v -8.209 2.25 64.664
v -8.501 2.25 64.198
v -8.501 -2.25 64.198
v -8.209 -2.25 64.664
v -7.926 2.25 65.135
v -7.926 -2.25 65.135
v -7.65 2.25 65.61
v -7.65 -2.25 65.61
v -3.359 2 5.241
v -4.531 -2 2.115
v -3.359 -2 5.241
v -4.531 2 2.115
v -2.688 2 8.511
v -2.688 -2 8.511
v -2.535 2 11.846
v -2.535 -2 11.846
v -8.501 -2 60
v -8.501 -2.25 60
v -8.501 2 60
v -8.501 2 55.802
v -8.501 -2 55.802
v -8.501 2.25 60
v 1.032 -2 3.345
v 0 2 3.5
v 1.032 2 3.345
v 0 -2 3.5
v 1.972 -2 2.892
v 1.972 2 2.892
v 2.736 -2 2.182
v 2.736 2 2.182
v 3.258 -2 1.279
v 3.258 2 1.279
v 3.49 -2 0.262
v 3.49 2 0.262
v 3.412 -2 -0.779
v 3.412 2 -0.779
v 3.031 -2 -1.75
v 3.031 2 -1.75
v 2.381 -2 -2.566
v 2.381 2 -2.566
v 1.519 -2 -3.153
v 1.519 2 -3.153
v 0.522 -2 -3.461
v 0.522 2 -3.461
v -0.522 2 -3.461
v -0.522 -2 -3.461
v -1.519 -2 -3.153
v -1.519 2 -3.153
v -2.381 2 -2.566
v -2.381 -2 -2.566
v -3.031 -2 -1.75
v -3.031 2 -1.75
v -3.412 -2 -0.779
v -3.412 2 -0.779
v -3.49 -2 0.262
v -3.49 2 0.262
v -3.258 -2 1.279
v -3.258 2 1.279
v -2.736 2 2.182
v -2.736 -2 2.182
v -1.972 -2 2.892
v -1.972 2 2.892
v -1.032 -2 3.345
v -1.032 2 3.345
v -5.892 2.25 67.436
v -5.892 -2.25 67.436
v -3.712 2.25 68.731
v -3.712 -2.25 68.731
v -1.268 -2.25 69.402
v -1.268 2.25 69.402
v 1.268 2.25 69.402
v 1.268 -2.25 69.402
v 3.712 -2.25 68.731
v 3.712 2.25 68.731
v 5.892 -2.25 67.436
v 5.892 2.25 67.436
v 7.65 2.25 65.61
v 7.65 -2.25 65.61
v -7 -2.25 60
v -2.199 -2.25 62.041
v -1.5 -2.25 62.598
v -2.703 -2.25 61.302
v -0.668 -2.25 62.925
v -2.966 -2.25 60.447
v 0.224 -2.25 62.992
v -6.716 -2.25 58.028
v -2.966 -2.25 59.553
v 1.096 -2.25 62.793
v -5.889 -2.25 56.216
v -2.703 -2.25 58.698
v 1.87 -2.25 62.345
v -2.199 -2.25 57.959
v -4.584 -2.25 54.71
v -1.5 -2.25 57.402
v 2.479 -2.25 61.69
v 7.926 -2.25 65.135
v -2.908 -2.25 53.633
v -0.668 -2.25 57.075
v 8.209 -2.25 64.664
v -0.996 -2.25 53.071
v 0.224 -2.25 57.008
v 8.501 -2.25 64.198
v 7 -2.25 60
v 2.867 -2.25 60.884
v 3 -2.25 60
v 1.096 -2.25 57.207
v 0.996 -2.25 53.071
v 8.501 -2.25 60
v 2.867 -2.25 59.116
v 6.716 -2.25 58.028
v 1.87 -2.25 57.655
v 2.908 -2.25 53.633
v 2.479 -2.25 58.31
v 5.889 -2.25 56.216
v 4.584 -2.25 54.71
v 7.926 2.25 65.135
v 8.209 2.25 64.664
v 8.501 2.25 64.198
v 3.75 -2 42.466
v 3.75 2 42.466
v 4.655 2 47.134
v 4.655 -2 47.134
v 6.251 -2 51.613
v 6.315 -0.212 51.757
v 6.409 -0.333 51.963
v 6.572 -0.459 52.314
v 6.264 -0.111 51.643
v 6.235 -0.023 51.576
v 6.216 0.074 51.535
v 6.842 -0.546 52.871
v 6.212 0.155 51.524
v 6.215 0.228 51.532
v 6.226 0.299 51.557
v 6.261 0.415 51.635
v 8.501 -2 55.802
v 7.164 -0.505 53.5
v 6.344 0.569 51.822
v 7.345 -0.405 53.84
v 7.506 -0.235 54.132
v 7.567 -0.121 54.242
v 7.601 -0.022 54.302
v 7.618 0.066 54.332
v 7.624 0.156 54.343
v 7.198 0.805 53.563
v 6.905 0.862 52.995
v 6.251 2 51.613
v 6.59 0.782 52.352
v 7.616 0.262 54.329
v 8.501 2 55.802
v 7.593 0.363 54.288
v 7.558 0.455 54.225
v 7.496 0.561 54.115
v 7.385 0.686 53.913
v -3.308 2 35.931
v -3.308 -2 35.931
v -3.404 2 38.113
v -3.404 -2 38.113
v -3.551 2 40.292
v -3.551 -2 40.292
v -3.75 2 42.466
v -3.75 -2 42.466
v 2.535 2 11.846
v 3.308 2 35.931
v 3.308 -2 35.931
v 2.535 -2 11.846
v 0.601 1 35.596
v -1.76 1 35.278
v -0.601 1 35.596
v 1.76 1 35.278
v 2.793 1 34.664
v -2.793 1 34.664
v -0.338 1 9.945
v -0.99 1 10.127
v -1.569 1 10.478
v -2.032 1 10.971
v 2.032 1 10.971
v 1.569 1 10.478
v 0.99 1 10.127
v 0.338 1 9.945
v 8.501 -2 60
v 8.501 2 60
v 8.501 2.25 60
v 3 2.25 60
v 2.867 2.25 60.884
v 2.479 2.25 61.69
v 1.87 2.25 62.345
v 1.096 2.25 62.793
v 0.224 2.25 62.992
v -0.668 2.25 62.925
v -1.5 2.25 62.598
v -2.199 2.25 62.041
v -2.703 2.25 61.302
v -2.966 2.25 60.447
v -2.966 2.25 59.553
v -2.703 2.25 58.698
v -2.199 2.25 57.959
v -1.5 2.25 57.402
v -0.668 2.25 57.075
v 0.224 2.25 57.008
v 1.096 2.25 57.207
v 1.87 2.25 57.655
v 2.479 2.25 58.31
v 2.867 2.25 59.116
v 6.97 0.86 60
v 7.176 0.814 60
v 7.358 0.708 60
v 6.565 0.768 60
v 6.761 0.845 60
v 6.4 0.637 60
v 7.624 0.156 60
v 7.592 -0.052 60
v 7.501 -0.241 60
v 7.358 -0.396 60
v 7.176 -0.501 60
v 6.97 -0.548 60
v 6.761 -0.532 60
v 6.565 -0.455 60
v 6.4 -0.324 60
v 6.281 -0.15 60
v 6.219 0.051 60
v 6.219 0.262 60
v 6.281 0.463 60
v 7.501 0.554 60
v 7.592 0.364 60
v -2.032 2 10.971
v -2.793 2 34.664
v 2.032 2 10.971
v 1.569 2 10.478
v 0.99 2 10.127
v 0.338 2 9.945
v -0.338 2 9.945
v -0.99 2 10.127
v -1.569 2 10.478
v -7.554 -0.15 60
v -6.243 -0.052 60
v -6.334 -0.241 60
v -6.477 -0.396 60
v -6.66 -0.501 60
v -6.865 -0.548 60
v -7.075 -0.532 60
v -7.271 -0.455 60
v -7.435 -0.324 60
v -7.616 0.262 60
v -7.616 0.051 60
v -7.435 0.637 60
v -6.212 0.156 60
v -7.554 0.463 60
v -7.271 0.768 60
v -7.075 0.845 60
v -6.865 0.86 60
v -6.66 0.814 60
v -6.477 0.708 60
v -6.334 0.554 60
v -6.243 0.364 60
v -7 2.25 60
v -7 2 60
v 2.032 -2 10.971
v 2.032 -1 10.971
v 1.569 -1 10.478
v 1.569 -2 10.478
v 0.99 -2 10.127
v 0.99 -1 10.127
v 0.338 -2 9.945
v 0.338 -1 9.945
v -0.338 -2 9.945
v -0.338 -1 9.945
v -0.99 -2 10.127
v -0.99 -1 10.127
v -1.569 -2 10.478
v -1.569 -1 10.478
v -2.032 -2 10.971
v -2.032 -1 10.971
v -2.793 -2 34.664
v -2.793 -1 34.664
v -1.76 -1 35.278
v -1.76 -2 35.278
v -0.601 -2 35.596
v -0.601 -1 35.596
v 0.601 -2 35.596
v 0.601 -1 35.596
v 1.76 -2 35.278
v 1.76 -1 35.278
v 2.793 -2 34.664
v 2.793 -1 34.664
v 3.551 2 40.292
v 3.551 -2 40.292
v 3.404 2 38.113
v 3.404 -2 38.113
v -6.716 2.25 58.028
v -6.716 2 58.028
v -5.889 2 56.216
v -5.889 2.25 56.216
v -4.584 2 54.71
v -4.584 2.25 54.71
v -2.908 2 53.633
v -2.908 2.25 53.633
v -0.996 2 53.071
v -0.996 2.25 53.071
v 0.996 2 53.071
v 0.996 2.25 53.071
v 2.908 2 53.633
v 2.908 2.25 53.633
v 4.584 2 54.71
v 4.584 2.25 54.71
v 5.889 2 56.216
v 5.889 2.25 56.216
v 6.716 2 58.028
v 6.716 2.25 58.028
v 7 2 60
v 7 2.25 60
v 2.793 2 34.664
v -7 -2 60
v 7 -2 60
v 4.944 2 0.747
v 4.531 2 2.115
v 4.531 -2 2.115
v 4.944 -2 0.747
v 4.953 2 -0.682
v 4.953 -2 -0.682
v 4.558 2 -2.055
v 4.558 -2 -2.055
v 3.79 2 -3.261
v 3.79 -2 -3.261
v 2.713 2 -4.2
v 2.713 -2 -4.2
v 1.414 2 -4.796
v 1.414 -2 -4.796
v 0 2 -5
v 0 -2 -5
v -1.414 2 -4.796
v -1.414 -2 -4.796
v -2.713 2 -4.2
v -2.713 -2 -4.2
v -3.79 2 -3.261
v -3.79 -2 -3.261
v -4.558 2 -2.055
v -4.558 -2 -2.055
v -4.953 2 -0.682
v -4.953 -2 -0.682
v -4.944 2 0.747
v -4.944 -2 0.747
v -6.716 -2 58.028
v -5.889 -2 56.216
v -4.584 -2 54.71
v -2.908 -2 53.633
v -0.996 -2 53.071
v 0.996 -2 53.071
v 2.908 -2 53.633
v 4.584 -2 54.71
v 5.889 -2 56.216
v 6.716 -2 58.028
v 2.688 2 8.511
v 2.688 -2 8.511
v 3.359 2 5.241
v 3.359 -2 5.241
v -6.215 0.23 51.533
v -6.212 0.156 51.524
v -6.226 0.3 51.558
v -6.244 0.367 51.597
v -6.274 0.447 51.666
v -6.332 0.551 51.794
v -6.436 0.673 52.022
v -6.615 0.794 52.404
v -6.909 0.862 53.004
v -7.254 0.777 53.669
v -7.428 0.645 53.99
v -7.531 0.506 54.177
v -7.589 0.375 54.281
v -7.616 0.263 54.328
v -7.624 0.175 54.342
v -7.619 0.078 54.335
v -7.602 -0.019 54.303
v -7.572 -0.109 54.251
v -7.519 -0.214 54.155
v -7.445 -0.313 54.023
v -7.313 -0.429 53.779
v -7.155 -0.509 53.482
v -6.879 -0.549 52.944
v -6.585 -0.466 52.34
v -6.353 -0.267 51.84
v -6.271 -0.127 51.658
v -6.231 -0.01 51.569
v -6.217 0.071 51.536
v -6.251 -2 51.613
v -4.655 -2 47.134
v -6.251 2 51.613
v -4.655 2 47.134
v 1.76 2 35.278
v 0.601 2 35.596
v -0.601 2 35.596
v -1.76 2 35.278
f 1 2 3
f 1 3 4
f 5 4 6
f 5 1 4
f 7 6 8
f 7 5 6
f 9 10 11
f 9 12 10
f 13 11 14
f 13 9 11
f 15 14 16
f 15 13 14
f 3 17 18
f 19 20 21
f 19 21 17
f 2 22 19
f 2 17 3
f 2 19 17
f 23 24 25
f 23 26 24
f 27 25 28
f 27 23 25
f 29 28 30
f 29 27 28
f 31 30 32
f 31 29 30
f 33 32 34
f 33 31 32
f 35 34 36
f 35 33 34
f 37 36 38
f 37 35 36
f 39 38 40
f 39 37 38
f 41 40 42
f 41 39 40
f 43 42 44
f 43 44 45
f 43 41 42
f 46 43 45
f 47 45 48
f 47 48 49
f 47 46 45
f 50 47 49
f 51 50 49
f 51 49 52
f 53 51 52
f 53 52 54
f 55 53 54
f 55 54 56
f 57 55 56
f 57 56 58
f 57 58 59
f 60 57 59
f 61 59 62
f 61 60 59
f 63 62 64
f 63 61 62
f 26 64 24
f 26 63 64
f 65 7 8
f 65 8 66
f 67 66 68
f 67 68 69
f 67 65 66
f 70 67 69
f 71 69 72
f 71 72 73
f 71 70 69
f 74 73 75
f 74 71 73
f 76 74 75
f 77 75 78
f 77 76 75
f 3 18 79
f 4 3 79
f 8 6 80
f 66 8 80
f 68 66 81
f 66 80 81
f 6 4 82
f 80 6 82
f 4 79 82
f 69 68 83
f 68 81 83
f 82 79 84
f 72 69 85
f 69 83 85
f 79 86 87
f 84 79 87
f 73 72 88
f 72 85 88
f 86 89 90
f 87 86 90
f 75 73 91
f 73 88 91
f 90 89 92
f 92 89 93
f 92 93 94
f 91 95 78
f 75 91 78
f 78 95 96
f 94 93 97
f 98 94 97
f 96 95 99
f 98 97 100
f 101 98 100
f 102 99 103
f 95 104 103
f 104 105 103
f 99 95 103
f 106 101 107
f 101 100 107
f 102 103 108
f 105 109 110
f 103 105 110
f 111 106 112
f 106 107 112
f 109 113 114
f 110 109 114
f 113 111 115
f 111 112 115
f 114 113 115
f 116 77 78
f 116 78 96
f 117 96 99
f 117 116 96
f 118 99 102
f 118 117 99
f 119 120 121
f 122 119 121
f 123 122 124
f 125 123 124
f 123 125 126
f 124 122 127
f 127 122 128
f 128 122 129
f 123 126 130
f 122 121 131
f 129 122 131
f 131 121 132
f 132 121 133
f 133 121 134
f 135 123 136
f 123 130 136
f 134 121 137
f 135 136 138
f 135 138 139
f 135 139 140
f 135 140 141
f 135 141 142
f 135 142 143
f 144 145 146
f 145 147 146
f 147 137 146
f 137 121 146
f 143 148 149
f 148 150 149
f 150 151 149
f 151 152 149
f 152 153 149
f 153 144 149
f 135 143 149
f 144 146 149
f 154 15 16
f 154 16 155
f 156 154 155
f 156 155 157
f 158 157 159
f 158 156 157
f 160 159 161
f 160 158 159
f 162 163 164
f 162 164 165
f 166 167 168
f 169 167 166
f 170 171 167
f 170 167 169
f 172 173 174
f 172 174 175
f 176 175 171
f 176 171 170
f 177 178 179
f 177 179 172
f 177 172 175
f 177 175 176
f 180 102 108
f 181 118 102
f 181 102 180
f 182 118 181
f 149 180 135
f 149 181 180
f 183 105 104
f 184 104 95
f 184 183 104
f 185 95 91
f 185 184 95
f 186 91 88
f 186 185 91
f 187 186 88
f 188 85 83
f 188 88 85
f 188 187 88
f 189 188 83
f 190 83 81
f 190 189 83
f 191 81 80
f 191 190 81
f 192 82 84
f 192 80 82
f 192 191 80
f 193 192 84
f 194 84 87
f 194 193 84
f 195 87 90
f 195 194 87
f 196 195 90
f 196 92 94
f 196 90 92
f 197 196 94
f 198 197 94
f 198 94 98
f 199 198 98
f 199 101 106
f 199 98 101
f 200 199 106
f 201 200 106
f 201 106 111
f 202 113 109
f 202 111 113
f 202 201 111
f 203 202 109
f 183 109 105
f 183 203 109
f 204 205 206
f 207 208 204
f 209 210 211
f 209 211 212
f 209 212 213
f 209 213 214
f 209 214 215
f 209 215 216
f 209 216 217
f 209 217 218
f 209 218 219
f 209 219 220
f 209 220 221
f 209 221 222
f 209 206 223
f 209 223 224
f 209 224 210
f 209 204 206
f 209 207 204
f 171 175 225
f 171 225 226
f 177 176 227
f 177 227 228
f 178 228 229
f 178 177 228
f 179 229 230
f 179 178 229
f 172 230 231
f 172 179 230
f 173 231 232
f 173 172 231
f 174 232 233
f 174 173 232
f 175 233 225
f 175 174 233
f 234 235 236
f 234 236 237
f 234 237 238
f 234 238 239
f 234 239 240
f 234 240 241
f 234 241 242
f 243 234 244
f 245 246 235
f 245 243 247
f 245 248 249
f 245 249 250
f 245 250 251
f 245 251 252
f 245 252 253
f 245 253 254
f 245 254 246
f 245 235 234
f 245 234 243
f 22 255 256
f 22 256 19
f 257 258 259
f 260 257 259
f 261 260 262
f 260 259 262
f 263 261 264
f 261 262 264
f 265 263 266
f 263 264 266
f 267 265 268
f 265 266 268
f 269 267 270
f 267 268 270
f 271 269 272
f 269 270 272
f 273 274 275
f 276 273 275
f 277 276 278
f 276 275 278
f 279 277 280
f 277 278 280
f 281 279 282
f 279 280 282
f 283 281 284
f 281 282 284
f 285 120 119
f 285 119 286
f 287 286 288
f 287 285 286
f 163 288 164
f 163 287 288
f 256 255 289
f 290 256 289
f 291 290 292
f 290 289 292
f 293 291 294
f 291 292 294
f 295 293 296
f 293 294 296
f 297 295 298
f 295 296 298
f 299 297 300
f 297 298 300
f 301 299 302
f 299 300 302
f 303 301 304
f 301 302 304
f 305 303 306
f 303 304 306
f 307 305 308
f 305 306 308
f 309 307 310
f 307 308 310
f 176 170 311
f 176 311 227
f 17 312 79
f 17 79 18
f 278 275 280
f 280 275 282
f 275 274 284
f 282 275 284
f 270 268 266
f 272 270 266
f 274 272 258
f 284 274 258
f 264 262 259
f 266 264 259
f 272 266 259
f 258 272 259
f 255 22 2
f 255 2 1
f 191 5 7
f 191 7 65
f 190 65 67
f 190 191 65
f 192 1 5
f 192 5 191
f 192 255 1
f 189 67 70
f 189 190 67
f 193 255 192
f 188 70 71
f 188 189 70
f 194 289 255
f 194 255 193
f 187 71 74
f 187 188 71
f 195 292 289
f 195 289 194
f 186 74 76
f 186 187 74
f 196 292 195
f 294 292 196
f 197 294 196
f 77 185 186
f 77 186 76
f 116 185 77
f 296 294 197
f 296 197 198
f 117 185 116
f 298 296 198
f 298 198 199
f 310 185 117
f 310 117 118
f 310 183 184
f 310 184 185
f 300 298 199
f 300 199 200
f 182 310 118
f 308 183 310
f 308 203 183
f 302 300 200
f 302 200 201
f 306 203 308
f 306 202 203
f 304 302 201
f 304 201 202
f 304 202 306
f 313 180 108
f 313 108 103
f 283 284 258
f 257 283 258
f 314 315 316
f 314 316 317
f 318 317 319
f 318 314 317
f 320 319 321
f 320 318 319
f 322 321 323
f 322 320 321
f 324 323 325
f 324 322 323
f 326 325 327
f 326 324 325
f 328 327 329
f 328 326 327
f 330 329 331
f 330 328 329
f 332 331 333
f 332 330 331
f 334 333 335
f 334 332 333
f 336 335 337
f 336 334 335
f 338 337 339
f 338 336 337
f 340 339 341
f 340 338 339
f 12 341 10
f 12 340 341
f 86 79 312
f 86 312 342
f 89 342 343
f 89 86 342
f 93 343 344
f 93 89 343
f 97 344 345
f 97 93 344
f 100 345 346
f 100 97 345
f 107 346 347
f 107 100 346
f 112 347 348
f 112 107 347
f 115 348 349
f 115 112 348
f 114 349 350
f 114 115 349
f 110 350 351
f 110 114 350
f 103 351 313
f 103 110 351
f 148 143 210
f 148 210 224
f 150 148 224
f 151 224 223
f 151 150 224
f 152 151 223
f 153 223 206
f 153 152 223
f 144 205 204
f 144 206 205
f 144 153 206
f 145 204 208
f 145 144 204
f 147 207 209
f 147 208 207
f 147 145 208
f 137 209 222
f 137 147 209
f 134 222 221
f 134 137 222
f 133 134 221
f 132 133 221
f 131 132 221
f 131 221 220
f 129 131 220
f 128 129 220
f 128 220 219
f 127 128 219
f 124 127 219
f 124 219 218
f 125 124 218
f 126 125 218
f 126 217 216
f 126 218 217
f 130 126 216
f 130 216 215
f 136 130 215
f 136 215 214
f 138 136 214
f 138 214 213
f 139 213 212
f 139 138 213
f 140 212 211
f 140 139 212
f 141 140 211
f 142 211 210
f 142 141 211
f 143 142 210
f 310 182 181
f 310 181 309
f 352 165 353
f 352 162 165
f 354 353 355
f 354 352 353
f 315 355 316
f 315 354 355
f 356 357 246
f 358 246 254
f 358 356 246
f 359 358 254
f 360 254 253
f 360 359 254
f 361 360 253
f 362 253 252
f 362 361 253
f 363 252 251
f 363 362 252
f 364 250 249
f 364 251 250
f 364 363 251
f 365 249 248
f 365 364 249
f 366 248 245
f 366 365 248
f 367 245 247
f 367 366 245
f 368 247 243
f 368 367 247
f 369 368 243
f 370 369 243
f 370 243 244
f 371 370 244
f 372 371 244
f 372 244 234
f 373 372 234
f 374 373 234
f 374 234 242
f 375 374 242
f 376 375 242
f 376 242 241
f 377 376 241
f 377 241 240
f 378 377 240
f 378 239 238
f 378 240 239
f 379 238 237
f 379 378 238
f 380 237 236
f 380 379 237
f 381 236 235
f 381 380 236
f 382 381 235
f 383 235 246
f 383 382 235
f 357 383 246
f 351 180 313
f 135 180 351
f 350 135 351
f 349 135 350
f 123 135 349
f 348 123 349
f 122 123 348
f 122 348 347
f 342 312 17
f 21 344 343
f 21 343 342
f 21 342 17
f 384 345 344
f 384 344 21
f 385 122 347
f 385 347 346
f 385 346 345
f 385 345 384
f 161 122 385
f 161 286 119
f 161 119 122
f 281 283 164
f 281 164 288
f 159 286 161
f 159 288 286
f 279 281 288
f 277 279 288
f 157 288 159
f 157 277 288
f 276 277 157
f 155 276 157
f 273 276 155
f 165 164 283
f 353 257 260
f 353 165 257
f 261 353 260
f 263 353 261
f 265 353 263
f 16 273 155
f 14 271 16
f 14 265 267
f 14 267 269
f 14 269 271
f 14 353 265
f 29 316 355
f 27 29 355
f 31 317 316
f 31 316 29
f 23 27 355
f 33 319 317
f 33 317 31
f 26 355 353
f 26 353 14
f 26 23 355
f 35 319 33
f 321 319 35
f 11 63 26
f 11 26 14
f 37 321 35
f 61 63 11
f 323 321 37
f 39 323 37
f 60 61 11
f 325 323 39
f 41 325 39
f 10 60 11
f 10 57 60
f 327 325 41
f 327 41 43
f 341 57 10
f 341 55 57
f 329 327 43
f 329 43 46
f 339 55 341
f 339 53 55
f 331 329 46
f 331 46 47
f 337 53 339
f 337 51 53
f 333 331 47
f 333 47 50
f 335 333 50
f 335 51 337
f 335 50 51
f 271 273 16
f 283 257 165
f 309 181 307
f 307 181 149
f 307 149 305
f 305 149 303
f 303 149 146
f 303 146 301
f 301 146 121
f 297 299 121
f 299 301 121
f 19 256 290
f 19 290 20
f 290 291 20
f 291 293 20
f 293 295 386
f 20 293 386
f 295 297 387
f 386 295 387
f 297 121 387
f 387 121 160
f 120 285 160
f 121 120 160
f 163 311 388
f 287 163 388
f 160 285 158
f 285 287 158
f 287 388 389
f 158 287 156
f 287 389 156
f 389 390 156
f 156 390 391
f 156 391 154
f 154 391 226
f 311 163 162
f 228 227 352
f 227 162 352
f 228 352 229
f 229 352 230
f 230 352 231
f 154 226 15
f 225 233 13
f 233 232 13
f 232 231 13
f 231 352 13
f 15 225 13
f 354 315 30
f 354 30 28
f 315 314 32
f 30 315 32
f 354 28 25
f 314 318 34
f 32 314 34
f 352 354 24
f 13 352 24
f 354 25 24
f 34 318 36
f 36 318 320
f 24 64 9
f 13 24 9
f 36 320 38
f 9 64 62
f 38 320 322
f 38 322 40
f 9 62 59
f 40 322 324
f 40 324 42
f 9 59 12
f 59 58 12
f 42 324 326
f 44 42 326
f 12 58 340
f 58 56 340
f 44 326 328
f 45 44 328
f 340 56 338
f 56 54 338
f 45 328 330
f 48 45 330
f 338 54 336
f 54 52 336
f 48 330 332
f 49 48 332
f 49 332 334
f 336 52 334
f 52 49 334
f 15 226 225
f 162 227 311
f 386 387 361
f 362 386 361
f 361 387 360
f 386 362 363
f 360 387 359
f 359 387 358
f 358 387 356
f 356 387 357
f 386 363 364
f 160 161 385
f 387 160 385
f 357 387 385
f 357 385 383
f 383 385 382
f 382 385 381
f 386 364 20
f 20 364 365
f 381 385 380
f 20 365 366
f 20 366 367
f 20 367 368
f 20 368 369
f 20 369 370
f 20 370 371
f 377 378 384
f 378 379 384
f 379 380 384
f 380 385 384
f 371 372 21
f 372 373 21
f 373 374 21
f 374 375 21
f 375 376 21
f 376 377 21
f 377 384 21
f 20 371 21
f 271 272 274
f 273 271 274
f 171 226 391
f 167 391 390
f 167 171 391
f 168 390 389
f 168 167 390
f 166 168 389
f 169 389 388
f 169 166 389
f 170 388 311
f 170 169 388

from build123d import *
from build123d.topology import SkipClean

# Parameters (mm, degrees)
SKETCH_1_R               = 5
SKETCH_1_R_2             = 3.5
EXTRUDE_1_DEPTH          = 2
EXTRUDE_2_DEPTH          = 2
CUT_EXTRUDE_1_DEPTH      = 61.539243471
CUT_EXTRUDE_1_DEPTH_BACK = 61.539243471
EXTRUDE_3_DEPTH          = 0.25
EXTRUDE_4_DEPTH          = 2
CUT_EXTRUDE_START        = 1
CUT_EXTRUDE_2_DEPTH      = 63.641007782
CUT_EXTRUDE_3_DEPTH      = 61.641007782
CUT_EXTRUDE_3_DEPTH_BACK = 61.641007782
SKETCH_8_R               = 0.706141664
EXTRUDE_5_DEPTH          = 4.5


with BuildPart() as part:
    # 草图1 → 凸台-拉伸1 (new, symmetric)
    with BuildSketch(Plane(origin=(0, 0, 0), x_dir=(1, 0, 0), z_dir=(0, 1, 0))):
        with Locations(Location((0, 0, 0), (0, 0, 270))):
            Circle(SKETCH_1_R)
        with Locations(Location((0, 0, 0), (0, 0, 270))):
            Circle(SKETCH_1_R_2, mode=Mode.SUBTRACT)
    extrude(amount=EXTRUDE_1_DEPTH, both=True)

    # 草图3 → 凸台-拉伸2 (add, symmetric)
    with BuildSketch(Plane(origin=(0, 0, 0), x_dir=(1, 0, 0), z_dir=(0, 1, 0))):
        with BuildLine():
            ThreePointArc((-4.530759254, -2.114762536), (-2.959942563, -6.862777701), (-2.534847218, -11.845789545))
            Line((-2.534847218, -11.845789545), (-3.308166283, -35.931035681))
            ThreePointArc((-3.308166283, -35.931035681), (-4.349252604, -47.119849682), (-6.737299363, -58.100316528))
            ThreePointArc((-6.737299363, -58.100316528), (0, -53), (6.737299363, -58.100316528))
            ThreePointArc((6.737299363, -58.100316528), (4.349252604, -47.119849682), (3.308166283, -35.931035681))
            Line((3.308166283, -35.931035681), (2.534847218, -11.845789545))
            ThreePointArc((2.534847218, -11.845789545), (2.959942563, -6.862777701), (4.530759254, -2.114762536))
            ThreePointArc((4.530759254, -2.114762536), (0, -5), (-4.530759254, -2.114762536))
        make_face()
        with BuildLine():
            Line((-7, -60), (7, -60))
            ThreePointArc((7, -60), (0, -53), (-7, -60))
        make_face()
    extrude(amount=EXTRUDE_2_DEPTH, both=True)

    # 草图4 → 切除-拉伸1 (cut, two sides: drawn at the far end of the back side and taken through both)
    with BuildSketch(Plane(origin=(0, 2, 0), x_dir=(1, 0, 0), z_dir=(0, 1, 0)).offset(-CUT_EXTRUDE_1_DEPTH_BACK)):
        with BuildLine():
            Line((-3, -60), (3, -60))
            ThreePointArc((3, -60), (0, -57), (-3, -60))
        make_face()
    extrude(amount=CUT_EXTRUDE_1_DEPTH + CUT_EXTRUDE_1_DEPTH_BACK, mode=Mode.SUBTRACT)

    # 草图5 → 凸台-拉伸3 (add, symmetric)
    with SkipClean():  # the faces are left unmerged after this step: merging them gives an invalid solid
        with BuildSketch(Plane(origin=(0, 2, 0), x_dir=(1, 0, 0), z_dir=(0, 1, 0))):
            with BuildLine():
                Line((-3, -60), (-7, -60))
                ThreePointArc((-7, -60), (0, -53), (7, -60))
                Line((7, -60), (3, -60))
                ThreePointArc((3, -60), (0, -57), (-3, -60))
            make_face()
        extrude_3 = extrude(amount=EXTRUDE_3_DEPTH, both=True)

    # 镜向1: 凸台-拉伸3 across plane
    with SkipClean():  # the faces are left unmerged after this step: merging them gives an invalid solid
        add(extrude_3.mirror(Plane.ZX))

    # 草图6 → 凸台-拉伸4 (add, symmetric)
    with BuildSketch(Plane(origin=(0, 0, 0), x_dir=(1, 0, 0), z_dir=(0, 1, 0))):
        with BuildLine():
            Line((-8.501136679, -55.801748406), (-8.501136679, -60))
            Line((-8.501136679, -60), (-7, -60))
            ThreePointArc((-7, -60), (-6.934013828, -59.041119283), (-6.737299363, -58.100316528))
            ThreePointArc((-6.737299363, -58.100316528), (-4.907121304, -50.347633667), (-3.749679969, -42.466391834))
            ThreePointArc((-3.749679969, -42.466391834), (-5.3686221, -49.403716977), (-8.501136679, -55.801748406))
        make_face()
        with BuildLine():
            Line((8.501136679, -60), (7, -60))
            ThreePointArc((7, -60), (6.934013828, -59.041119283), (6.737299363, -58.100316528))
            ThreePointArc((6.737299363, -58.100316528), (4.907121304, -50.347633667), (3.749679969, -42.466391834))
            ThreePointArc((3.749679969, -42.466391834), (5.3686221, -49.403716977), (8.501136679, -55.801748406))
            Line((8.501136679, -55.801748406), (8.501136679, -60))
        make_face()
    extrude(amount=EXTRUDE_4_DEPTH, both=True)

    # 草图7 → 切除-拉伸2 (cut)
    with BuildSketch(Plane(origin=(0, 0, 0), x_dir=(1, 0, 0), z_dir=(0, 1, 0)).offset(CUT_EXTRUDE_START)):
        with BuildLine():
            Line((-2.032181597, -10.971248009), (-2.792905901, -34.66422669))
            ThreePointArc((-2.792905901, -34.66422669), (0, -35.636501302), (2.792905901, -34.66422669))
            Line((2.792905901, -34.66422669), (2.032181597, -10.971248009))
            ThreePointArc((2.032181597, -10.971248009), (0, -9.921815328), (-2.032181597, -10.971248009))
        make_face()
    cut_extrude_2 = extrude(amount=CUT_EXTRUDE_2_DEPTH, mode=Mode.SUBTRACT)

    # 镜向2: 切除-拉伸2 across plane
    add(cut_extrude_2.mirror(Plane.ZX), mode=Mode.SUBTRACT)

    # 草图8 → 切除-拉伸3 (cut, two sides: drawn at the far end of the back side and taken through both)
    with BuildSketch(Plane.XY.offset(-CUT_EXTRUDE_3_DEPTH_BACK)):
        with Locations((-6.917679895, 0.156331749)):
            Circle(SKETCH_8_R)
        with Locations((6.917679895, 0.156331749)):
            Circle(SKETCH_8_R)
    extrude(amount=CUT_EXTRUDE_3_DEPTH + CUT_EXTRUDE_3_DEPTH_BACK, mode=Mode.SUBTRACT)

    # 草图11 → 凸台-拉伸5 (add)
    with BuildSketch(Plane(origin=(0, 2.25, 0), x_dir=(1, 0, 0), z_dir=(0, 1, 0))):
        with BuildLine():
            Line((8.501136679, -64.198251594), (8.501136679, -60))
            Line((8.501136679, -60), (3, -60))
            ThreePointArc((3, -60), (0, -63), (-3, -60))
            Line((-3, -60), (-8.501136679, -60))
            Line((-8.501136679, -60), (-8.501136679, -64.198251594))
            ThreePointArc((-8.501136679, -64.198251594), (-8.066557797, -64.898765683), (-7.650409709, -65.61038325))
            ThreePointArc((-7.650409709, -65.61038325), (0, -69.487105403), (7.650409709, -65.61038325))
            ThreePointArc((7.650409709, -65.61038325), (8.066557797, -64.898765683), (8.501136679, -64.198251594))
        make_face()
    extrude(amount=-EXTRUDE_5_DEPTH)


solid = part.part
